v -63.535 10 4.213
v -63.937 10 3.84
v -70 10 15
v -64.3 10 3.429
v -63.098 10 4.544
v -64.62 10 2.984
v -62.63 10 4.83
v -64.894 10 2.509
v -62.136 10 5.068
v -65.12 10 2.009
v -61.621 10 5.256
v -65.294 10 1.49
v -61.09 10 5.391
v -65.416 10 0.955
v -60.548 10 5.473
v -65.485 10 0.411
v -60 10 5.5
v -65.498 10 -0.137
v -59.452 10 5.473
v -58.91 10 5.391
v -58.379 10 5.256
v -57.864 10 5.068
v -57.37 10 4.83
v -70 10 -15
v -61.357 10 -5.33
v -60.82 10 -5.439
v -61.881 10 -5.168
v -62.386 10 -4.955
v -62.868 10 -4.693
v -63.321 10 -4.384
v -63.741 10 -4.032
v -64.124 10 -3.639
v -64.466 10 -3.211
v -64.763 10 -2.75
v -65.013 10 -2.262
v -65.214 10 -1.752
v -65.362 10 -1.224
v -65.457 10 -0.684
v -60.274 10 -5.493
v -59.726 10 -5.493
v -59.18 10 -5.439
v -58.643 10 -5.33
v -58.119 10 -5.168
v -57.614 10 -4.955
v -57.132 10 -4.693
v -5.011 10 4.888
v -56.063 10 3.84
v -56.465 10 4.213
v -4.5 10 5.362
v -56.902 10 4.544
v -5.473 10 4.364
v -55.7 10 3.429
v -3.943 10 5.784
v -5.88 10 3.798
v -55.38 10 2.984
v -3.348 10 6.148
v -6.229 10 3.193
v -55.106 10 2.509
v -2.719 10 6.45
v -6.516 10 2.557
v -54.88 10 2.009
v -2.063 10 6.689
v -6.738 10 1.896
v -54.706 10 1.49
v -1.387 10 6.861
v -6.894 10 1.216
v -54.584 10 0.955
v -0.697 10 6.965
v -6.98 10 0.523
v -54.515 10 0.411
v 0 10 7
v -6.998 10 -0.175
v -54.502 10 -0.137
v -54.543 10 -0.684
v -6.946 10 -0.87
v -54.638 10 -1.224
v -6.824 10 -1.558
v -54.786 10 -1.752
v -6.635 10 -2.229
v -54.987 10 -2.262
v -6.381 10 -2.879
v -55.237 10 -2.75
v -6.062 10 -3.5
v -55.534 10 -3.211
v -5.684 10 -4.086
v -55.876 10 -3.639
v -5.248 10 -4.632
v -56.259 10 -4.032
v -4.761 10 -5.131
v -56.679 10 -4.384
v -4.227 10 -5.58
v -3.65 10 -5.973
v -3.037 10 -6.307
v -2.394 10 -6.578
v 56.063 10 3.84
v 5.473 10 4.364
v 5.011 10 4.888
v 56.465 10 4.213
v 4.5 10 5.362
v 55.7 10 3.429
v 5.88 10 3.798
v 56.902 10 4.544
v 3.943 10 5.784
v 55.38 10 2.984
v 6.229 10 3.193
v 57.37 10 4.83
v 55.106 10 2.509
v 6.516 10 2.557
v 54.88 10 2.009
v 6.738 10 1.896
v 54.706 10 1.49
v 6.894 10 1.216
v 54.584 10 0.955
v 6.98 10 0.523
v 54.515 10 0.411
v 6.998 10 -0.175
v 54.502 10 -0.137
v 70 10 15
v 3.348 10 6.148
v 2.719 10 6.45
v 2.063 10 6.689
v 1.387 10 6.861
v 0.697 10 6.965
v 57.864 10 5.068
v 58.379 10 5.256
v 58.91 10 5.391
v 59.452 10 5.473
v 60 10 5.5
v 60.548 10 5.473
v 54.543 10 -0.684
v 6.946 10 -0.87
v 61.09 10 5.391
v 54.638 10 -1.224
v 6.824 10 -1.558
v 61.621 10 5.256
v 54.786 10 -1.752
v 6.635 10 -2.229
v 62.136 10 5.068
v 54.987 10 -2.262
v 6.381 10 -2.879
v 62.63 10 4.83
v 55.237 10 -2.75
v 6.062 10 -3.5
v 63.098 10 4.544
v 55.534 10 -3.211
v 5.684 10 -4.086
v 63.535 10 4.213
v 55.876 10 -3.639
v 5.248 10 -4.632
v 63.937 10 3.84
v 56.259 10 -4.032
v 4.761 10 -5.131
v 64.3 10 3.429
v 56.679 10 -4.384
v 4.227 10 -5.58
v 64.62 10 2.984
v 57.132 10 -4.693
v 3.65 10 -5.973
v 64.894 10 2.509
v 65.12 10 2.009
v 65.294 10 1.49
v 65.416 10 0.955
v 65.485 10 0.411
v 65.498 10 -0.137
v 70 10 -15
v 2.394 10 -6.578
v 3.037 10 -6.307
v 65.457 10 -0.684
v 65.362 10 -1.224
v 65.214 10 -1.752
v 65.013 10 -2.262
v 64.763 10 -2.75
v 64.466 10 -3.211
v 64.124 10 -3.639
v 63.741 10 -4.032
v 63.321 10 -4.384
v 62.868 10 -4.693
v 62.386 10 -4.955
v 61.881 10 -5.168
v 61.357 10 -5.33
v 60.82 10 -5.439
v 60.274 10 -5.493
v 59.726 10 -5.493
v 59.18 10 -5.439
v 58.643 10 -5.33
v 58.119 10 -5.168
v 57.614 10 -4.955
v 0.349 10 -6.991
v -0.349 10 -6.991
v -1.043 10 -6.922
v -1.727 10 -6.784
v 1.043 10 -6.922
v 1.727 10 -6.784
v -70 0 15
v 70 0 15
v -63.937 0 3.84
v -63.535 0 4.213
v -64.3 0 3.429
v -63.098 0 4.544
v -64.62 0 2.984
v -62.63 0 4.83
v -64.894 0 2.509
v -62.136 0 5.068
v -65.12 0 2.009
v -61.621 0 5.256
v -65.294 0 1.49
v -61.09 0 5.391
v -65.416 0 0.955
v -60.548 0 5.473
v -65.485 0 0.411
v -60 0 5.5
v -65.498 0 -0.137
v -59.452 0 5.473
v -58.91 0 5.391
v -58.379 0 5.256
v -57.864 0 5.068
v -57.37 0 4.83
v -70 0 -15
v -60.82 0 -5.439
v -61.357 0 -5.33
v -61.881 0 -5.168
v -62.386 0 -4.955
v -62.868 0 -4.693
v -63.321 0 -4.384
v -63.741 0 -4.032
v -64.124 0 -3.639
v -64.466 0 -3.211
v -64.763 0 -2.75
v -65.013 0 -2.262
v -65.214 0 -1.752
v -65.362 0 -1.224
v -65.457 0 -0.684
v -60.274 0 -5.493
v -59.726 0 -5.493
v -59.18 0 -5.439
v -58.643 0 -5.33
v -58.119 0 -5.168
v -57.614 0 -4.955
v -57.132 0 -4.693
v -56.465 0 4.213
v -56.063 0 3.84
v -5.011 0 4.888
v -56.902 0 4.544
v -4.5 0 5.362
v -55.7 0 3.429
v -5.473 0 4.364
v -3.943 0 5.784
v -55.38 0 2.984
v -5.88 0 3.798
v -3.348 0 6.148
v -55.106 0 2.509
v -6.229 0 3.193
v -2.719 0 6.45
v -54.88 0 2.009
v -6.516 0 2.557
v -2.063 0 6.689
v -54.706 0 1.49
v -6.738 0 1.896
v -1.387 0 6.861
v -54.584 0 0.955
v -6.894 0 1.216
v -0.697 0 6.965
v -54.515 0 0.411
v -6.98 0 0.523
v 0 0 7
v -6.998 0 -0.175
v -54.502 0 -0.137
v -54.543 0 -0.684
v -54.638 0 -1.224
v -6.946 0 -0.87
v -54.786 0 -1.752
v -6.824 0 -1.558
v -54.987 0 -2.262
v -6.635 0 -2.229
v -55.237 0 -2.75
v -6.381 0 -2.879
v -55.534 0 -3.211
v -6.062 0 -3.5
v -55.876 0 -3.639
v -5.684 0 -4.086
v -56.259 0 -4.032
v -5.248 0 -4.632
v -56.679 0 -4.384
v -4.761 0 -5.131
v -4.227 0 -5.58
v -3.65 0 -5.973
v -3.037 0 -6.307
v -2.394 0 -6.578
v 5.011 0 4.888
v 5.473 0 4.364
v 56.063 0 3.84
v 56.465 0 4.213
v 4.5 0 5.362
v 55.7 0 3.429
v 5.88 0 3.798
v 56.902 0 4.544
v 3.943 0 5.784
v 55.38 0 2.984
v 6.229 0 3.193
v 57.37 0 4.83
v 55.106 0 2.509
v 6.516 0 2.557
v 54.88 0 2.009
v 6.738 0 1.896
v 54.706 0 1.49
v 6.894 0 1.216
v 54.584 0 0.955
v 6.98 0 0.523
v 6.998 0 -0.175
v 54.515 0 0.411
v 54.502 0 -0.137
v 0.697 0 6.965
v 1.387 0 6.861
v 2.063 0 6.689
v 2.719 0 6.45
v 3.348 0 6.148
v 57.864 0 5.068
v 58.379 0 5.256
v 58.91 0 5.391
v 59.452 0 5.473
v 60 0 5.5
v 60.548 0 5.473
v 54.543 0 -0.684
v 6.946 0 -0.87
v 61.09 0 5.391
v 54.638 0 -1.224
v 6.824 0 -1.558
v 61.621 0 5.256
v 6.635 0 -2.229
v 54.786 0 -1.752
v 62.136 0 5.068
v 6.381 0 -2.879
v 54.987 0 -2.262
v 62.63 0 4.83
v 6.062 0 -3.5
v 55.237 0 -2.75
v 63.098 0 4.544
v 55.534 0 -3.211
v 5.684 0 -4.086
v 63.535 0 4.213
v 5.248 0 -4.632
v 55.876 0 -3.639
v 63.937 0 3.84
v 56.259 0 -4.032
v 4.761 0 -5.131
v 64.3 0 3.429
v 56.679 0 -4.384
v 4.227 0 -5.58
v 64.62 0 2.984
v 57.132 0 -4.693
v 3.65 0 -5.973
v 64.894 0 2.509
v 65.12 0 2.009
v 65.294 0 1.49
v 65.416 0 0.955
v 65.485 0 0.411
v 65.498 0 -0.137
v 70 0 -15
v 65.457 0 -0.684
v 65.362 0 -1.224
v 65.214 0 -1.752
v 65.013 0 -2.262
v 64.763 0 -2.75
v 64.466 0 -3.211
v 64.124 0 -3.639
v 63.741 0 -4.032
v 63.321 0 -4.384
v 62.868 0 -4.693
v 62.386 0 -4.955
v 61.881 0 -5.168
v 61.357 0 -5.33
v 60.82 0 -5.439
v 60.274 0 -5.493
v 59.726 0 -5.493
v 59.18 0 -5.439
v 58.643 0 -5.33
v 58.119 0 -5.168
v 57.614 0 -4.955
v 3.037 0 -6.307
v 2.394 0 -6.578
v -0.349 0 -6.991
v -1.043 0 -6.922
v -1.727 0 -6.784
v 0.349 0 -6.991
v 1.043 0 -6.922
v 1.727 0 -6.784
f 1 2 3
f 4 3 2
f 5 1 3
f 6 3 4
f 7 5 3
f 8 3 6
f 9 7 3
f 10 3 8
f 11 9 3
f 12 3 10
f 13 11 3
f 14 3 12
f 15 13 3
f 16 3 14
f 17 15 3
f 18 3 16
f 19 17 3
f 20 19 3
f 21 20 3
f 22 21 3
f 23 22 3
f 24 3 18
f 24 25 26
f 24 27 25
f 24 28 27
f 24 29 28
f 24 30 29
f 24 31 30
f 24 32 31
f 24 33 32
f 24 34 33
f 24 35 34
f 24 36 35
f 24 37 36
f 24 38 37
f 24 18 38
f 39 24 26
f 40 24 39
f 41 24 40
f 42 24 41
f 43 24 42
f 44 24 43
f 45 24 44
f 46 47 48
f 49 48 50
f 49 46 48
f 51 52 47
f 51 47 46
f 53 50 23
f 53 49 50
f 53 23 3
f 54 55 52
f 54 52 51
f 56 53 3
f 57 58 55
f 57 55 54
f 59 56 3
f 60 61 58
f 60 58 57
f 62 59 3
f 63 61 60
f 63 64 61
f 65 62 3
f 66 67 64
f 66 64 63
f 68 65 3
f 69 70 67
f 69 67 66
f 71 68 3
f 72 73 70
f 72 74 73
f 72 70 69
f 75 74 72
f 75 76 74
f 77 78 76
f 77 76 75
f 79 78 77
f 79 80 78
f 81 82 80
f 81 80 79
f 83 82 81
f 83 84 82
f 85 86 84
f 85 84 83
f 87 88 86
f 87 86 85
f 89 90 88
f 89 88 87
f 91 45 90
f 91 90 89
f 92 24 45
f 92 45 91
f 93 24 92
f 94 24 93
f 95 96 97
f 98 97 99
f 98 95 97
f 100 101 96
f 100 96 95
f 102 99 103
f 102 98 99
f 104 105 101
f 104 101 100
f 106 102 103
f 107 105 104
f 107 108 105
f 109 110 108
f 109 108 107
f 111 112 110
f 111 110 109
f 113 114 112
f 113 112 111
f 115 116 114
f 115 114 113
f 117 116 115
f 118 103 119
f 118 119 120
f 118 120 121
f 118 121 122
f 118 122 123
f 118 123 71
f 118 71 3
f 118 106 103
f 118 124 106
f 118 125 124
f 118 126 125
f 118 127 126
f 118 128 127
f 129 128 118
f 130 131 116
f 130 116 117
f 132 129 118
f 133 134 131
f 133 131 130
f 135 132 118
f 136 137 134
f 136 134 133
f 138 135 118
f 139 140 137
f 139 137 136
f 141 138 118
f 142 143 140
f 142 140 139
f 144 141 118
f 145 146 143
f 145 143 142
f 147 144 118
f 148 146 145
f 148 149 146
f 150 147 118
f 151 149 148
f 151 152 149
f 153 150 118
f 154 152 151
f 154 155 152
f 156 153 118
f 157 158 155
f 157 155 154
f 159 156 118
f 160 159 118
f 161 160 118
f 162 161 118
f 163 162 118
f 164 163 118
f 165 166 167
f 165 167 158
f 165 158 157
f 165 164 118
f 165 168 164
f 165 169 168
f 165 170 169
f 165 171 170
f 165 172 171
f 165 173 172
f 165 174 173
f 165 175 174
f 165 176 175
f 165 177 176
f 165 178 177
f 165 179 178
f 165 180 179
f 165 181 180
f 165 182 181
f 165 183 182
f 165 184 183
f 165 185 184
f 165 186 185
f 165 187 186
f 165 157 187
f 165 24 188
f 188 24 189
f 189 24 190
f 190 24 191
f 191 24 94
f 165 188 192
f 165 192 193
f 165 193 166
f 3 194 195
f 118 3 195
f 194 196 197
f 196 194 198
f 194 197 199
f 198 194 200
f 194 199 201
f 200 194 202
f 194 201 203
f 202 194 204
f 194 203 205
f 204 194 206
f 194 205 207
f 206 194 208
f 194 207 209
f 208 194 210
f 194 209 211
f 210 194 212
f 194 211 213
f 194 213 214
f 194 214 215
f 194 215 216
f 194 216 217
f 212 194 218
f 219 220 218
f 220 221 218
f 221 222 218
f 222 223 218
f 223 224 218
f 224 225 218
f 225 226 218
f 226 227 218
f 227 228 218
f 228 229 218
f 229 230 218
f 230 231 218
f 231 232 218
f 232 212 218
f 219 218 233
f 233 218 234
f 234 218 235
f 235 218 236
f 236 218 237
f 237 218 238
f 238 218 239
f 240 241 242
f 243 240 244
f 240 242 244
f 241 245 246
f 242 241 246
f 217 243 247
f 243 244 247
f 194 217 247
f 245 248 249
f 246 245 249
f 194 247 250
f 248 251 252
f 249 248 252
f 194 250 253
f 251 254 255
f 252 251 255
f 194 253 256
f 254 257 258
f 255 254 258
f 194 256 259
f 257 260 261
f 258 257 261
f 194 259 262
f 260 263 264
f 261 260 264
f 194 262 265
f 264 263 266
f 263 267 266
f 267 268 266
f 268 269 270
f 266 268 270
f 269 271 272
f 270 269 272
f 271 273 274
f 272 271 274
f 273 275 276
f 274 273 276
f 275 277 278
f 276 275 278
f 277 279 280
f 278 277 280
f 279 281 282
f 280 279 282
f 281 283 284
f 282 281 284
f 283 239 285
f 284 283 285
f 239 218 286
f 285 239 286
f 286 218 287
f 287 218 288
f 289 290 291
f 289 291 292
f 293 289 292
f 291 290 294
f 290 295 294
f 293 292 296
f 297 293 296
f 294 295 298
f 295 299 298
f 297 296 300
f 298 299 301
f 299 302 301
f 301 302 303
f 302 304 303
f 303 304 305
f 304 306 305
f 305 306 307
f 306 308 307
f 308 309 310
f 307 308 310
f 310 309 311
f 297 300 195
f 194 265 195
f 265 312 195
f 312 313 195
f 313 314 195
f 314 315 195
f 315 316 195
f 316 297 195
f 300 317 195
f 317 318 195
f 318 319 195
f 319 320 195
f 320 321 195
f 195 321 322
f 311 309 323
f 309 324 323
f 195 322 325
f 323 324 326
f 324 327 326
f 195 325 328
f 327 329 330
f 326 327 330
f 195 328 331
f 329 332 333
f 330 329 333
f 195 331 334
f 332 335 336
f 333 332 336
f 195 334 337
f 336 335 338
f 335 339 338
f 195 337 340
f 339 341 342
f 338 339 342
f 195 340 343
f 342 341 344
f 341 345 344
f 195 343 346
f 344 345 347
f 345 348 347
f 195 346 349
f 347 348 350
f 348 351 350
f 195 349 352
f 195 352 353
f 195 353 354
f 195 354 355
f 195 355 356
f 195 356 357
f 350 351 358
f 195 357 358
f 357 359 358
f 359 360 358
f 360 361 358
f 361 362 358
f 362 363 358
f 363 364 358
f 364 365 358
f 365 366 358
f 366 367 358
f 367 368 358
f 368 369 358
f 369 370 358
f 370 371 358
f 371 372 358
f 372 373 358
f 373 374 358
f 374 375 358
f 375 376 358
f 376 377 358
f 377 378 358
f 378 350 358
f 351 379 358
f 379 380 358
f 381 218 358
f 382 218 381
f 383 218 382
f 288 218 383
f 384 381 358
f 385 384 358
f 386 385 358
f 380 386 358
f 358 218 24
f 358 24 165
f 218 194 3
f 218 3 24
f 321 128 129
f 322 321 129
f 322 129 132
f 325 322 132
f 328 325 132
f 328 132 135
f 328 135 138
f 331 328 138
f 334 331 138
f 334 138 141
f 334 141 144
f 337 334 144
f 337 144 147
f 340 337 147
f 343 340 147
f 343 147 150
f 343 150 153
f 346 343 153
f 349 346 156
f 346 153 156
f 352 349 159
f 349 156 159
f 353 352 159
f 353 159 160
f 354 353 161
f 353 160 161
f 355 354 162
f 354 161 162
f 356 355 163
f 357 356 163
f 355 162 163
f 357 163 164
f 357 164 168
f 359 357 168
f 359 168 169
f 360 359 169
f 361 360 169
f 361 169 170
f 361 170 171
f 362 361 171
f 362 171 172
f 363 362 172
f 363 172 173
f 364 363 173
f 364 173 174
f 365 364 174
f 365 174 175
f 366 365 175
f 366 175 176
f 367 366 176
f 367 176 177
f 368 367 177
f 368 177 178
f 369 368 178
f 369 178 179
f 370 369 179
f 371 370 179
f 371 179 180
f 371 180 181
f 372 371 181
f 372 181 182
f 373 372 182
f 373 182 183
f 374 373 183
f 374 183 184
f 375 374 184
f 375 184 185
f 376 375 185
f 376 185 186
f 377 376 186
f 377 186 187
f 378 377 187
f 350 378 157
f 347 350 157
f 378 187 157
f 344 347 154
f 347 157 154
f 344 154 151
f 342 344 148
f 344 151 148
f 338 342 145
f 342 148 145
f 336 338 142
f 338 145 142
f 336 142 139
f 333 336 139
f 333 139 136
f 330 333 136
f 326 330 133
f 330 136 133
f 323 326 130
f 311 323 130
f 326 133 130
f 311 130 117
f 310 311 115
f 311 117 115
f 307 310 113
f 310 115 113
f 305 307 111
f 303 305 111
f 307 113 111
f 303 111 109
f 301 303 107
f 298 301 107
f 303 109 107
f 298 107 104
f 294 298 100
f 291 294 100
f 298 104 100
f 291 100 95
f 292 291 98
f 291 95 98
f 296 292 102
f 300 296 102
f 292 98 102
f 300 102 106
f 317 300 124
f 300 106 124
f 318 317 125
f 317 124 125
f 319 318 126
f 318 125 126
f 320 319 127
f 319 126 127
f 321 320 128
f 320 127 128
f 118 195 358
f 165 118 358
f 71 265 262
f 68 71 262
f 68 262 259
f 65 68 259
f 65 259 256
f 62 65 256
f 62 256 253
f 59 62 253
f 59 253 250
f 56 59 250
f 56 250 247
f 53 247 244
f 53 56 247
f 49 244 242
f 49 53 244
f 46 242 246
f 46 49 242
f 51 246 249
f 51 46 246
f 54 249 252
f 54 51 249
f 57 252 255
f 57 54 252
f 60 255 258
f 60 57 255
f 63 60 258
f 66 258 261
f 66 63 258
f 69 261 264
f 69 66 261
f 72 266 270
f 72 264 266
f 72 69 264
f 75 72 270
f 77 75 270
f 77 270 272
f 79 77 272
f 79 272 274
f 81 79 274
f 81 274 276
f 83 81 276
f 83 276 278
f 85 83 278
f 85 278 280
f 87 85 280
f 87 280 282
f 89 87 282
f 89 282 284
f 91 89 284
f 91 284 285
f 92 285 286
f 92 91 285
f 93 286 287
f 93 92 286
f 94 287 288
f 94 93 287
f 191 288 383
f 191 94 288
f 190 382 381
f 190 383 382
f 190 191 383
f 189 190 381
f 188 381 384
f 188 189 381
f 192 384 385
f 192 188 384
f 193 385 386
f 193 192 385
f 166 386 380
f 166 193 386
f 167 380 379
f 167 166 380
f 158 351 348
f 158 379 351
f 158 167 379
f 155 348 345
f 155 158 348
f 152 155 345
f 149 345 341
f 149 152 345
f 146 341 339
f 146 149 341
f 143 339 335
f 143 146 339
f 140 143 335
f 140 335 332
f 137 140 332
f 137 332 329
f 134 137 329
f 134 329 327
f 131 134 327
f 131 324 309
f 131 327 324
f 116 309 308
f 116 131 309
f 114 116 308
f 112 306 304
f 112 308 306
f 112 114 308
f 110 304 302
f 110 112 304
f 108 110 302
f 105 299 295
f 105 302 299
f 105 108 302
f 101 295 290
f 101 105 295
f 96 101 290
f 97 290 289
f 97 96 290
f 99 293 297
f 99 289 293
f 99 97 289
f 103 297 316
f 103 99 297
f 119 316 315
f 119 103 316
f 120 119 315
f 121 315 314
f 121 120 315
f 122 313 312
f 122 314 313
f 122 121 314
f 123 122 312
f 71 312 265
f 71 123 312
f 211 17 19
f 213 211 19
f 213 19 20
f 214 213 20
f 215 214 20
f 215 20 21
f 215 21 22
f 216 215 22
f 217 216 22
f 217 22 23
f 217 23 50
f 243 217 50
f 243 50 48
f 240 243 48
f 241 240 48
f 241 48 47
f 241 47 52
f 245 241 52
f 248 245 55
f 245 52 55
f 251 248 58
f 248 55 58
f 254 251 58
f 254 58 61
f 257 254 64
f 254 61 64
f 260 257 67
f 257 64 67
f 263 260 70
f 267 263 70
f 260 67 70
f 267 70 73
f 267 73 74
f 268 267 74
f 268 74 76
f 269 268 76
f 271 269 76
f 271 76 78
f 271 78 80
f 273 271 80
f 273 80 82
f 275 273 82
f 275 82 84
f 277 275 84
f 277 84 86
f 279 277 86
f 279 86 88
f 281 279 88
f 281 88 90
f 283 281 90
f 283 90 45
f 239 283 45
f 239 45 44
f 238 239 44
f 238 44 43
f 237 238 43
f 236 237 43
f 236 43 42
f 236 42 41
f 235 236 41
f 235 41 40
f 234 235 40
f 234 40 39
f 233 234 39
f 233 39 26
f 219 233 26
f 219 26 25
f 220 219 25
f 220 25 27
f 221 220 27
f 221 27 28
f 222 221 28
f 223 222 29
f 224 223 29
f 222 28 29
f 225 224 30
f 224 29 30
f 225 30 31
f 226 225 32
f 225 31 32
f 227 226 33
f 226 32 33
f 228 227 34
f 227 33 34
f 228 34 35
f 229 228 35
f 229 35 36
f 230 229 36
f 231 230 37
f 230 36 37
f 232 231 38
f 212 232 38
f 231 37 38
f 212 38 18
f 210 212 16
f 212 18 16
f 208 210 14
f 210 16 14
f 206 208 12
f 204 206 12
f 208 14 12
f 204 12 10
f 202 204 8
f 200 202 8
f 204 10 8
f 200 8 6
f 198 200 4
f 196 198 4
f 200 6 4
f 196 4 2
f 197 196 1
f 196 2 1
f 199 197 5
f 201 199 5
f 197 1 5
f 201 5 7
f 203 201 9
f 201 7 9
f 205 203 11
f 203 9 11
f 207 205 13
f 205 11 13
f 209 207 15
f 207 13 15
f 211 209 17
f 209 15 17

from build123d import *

# Parameters (mm, degrees)
SKETCH1_W           = 140
SKETCH1_H           = 30
BOSS_EXTRUDE1_DEPTH = 10
SKETCH2_R           = 5.5
CUT_EXTRUDE1_DEPTH  = 73.284161474


with BuildPart() as part:
    # Sketch1 → Boss-Extrude1 (new body)
    with BuildSketch(Plane(origin=(0, 0, 0), x_dir=(1, 0, 0), z_dir=(0, 1, 0))):
        Rectangle(SKETCH1_W, SKETCH1_H)
    extrude(amount=BOSS_EXTRUDE1_DEPTH)

    # Sketch2 → Cut-Extrude1 (cut, through all)
    with BuildSketch(Plane(origin=(0, 10, 0), x_dir=(1, 0, 0), z_dir=(0, 1, 0))):
        with Locations(Location((-60, 0, 0), (0, 0, 270))):
            Circle(SKETCH2_R)
        with Locations(Location((60, 0, 0), (0, 0, 270))):
            Circle(SKETCH2_R)
    extrude(amount=-CUT_EXTRUDE1_DEPTH, mode=Mode.SUBTRACT)

    # Sketch4 → M16 Tapped Hole1 (revolve, cut)
    with BuildSketch(Plane(origin=(0, 10, 0), x_dir=(0, 0, 1), z_dir=(1, 0, 0))):
        Polygon((0, 0), (0, 45), (7, 38), (7, 0), align=None)
    revolve(axis=Axis((0, 16.35, 0), (0, -1, 0)), mode=Mode.SUBTRACT)


solid = part.part
